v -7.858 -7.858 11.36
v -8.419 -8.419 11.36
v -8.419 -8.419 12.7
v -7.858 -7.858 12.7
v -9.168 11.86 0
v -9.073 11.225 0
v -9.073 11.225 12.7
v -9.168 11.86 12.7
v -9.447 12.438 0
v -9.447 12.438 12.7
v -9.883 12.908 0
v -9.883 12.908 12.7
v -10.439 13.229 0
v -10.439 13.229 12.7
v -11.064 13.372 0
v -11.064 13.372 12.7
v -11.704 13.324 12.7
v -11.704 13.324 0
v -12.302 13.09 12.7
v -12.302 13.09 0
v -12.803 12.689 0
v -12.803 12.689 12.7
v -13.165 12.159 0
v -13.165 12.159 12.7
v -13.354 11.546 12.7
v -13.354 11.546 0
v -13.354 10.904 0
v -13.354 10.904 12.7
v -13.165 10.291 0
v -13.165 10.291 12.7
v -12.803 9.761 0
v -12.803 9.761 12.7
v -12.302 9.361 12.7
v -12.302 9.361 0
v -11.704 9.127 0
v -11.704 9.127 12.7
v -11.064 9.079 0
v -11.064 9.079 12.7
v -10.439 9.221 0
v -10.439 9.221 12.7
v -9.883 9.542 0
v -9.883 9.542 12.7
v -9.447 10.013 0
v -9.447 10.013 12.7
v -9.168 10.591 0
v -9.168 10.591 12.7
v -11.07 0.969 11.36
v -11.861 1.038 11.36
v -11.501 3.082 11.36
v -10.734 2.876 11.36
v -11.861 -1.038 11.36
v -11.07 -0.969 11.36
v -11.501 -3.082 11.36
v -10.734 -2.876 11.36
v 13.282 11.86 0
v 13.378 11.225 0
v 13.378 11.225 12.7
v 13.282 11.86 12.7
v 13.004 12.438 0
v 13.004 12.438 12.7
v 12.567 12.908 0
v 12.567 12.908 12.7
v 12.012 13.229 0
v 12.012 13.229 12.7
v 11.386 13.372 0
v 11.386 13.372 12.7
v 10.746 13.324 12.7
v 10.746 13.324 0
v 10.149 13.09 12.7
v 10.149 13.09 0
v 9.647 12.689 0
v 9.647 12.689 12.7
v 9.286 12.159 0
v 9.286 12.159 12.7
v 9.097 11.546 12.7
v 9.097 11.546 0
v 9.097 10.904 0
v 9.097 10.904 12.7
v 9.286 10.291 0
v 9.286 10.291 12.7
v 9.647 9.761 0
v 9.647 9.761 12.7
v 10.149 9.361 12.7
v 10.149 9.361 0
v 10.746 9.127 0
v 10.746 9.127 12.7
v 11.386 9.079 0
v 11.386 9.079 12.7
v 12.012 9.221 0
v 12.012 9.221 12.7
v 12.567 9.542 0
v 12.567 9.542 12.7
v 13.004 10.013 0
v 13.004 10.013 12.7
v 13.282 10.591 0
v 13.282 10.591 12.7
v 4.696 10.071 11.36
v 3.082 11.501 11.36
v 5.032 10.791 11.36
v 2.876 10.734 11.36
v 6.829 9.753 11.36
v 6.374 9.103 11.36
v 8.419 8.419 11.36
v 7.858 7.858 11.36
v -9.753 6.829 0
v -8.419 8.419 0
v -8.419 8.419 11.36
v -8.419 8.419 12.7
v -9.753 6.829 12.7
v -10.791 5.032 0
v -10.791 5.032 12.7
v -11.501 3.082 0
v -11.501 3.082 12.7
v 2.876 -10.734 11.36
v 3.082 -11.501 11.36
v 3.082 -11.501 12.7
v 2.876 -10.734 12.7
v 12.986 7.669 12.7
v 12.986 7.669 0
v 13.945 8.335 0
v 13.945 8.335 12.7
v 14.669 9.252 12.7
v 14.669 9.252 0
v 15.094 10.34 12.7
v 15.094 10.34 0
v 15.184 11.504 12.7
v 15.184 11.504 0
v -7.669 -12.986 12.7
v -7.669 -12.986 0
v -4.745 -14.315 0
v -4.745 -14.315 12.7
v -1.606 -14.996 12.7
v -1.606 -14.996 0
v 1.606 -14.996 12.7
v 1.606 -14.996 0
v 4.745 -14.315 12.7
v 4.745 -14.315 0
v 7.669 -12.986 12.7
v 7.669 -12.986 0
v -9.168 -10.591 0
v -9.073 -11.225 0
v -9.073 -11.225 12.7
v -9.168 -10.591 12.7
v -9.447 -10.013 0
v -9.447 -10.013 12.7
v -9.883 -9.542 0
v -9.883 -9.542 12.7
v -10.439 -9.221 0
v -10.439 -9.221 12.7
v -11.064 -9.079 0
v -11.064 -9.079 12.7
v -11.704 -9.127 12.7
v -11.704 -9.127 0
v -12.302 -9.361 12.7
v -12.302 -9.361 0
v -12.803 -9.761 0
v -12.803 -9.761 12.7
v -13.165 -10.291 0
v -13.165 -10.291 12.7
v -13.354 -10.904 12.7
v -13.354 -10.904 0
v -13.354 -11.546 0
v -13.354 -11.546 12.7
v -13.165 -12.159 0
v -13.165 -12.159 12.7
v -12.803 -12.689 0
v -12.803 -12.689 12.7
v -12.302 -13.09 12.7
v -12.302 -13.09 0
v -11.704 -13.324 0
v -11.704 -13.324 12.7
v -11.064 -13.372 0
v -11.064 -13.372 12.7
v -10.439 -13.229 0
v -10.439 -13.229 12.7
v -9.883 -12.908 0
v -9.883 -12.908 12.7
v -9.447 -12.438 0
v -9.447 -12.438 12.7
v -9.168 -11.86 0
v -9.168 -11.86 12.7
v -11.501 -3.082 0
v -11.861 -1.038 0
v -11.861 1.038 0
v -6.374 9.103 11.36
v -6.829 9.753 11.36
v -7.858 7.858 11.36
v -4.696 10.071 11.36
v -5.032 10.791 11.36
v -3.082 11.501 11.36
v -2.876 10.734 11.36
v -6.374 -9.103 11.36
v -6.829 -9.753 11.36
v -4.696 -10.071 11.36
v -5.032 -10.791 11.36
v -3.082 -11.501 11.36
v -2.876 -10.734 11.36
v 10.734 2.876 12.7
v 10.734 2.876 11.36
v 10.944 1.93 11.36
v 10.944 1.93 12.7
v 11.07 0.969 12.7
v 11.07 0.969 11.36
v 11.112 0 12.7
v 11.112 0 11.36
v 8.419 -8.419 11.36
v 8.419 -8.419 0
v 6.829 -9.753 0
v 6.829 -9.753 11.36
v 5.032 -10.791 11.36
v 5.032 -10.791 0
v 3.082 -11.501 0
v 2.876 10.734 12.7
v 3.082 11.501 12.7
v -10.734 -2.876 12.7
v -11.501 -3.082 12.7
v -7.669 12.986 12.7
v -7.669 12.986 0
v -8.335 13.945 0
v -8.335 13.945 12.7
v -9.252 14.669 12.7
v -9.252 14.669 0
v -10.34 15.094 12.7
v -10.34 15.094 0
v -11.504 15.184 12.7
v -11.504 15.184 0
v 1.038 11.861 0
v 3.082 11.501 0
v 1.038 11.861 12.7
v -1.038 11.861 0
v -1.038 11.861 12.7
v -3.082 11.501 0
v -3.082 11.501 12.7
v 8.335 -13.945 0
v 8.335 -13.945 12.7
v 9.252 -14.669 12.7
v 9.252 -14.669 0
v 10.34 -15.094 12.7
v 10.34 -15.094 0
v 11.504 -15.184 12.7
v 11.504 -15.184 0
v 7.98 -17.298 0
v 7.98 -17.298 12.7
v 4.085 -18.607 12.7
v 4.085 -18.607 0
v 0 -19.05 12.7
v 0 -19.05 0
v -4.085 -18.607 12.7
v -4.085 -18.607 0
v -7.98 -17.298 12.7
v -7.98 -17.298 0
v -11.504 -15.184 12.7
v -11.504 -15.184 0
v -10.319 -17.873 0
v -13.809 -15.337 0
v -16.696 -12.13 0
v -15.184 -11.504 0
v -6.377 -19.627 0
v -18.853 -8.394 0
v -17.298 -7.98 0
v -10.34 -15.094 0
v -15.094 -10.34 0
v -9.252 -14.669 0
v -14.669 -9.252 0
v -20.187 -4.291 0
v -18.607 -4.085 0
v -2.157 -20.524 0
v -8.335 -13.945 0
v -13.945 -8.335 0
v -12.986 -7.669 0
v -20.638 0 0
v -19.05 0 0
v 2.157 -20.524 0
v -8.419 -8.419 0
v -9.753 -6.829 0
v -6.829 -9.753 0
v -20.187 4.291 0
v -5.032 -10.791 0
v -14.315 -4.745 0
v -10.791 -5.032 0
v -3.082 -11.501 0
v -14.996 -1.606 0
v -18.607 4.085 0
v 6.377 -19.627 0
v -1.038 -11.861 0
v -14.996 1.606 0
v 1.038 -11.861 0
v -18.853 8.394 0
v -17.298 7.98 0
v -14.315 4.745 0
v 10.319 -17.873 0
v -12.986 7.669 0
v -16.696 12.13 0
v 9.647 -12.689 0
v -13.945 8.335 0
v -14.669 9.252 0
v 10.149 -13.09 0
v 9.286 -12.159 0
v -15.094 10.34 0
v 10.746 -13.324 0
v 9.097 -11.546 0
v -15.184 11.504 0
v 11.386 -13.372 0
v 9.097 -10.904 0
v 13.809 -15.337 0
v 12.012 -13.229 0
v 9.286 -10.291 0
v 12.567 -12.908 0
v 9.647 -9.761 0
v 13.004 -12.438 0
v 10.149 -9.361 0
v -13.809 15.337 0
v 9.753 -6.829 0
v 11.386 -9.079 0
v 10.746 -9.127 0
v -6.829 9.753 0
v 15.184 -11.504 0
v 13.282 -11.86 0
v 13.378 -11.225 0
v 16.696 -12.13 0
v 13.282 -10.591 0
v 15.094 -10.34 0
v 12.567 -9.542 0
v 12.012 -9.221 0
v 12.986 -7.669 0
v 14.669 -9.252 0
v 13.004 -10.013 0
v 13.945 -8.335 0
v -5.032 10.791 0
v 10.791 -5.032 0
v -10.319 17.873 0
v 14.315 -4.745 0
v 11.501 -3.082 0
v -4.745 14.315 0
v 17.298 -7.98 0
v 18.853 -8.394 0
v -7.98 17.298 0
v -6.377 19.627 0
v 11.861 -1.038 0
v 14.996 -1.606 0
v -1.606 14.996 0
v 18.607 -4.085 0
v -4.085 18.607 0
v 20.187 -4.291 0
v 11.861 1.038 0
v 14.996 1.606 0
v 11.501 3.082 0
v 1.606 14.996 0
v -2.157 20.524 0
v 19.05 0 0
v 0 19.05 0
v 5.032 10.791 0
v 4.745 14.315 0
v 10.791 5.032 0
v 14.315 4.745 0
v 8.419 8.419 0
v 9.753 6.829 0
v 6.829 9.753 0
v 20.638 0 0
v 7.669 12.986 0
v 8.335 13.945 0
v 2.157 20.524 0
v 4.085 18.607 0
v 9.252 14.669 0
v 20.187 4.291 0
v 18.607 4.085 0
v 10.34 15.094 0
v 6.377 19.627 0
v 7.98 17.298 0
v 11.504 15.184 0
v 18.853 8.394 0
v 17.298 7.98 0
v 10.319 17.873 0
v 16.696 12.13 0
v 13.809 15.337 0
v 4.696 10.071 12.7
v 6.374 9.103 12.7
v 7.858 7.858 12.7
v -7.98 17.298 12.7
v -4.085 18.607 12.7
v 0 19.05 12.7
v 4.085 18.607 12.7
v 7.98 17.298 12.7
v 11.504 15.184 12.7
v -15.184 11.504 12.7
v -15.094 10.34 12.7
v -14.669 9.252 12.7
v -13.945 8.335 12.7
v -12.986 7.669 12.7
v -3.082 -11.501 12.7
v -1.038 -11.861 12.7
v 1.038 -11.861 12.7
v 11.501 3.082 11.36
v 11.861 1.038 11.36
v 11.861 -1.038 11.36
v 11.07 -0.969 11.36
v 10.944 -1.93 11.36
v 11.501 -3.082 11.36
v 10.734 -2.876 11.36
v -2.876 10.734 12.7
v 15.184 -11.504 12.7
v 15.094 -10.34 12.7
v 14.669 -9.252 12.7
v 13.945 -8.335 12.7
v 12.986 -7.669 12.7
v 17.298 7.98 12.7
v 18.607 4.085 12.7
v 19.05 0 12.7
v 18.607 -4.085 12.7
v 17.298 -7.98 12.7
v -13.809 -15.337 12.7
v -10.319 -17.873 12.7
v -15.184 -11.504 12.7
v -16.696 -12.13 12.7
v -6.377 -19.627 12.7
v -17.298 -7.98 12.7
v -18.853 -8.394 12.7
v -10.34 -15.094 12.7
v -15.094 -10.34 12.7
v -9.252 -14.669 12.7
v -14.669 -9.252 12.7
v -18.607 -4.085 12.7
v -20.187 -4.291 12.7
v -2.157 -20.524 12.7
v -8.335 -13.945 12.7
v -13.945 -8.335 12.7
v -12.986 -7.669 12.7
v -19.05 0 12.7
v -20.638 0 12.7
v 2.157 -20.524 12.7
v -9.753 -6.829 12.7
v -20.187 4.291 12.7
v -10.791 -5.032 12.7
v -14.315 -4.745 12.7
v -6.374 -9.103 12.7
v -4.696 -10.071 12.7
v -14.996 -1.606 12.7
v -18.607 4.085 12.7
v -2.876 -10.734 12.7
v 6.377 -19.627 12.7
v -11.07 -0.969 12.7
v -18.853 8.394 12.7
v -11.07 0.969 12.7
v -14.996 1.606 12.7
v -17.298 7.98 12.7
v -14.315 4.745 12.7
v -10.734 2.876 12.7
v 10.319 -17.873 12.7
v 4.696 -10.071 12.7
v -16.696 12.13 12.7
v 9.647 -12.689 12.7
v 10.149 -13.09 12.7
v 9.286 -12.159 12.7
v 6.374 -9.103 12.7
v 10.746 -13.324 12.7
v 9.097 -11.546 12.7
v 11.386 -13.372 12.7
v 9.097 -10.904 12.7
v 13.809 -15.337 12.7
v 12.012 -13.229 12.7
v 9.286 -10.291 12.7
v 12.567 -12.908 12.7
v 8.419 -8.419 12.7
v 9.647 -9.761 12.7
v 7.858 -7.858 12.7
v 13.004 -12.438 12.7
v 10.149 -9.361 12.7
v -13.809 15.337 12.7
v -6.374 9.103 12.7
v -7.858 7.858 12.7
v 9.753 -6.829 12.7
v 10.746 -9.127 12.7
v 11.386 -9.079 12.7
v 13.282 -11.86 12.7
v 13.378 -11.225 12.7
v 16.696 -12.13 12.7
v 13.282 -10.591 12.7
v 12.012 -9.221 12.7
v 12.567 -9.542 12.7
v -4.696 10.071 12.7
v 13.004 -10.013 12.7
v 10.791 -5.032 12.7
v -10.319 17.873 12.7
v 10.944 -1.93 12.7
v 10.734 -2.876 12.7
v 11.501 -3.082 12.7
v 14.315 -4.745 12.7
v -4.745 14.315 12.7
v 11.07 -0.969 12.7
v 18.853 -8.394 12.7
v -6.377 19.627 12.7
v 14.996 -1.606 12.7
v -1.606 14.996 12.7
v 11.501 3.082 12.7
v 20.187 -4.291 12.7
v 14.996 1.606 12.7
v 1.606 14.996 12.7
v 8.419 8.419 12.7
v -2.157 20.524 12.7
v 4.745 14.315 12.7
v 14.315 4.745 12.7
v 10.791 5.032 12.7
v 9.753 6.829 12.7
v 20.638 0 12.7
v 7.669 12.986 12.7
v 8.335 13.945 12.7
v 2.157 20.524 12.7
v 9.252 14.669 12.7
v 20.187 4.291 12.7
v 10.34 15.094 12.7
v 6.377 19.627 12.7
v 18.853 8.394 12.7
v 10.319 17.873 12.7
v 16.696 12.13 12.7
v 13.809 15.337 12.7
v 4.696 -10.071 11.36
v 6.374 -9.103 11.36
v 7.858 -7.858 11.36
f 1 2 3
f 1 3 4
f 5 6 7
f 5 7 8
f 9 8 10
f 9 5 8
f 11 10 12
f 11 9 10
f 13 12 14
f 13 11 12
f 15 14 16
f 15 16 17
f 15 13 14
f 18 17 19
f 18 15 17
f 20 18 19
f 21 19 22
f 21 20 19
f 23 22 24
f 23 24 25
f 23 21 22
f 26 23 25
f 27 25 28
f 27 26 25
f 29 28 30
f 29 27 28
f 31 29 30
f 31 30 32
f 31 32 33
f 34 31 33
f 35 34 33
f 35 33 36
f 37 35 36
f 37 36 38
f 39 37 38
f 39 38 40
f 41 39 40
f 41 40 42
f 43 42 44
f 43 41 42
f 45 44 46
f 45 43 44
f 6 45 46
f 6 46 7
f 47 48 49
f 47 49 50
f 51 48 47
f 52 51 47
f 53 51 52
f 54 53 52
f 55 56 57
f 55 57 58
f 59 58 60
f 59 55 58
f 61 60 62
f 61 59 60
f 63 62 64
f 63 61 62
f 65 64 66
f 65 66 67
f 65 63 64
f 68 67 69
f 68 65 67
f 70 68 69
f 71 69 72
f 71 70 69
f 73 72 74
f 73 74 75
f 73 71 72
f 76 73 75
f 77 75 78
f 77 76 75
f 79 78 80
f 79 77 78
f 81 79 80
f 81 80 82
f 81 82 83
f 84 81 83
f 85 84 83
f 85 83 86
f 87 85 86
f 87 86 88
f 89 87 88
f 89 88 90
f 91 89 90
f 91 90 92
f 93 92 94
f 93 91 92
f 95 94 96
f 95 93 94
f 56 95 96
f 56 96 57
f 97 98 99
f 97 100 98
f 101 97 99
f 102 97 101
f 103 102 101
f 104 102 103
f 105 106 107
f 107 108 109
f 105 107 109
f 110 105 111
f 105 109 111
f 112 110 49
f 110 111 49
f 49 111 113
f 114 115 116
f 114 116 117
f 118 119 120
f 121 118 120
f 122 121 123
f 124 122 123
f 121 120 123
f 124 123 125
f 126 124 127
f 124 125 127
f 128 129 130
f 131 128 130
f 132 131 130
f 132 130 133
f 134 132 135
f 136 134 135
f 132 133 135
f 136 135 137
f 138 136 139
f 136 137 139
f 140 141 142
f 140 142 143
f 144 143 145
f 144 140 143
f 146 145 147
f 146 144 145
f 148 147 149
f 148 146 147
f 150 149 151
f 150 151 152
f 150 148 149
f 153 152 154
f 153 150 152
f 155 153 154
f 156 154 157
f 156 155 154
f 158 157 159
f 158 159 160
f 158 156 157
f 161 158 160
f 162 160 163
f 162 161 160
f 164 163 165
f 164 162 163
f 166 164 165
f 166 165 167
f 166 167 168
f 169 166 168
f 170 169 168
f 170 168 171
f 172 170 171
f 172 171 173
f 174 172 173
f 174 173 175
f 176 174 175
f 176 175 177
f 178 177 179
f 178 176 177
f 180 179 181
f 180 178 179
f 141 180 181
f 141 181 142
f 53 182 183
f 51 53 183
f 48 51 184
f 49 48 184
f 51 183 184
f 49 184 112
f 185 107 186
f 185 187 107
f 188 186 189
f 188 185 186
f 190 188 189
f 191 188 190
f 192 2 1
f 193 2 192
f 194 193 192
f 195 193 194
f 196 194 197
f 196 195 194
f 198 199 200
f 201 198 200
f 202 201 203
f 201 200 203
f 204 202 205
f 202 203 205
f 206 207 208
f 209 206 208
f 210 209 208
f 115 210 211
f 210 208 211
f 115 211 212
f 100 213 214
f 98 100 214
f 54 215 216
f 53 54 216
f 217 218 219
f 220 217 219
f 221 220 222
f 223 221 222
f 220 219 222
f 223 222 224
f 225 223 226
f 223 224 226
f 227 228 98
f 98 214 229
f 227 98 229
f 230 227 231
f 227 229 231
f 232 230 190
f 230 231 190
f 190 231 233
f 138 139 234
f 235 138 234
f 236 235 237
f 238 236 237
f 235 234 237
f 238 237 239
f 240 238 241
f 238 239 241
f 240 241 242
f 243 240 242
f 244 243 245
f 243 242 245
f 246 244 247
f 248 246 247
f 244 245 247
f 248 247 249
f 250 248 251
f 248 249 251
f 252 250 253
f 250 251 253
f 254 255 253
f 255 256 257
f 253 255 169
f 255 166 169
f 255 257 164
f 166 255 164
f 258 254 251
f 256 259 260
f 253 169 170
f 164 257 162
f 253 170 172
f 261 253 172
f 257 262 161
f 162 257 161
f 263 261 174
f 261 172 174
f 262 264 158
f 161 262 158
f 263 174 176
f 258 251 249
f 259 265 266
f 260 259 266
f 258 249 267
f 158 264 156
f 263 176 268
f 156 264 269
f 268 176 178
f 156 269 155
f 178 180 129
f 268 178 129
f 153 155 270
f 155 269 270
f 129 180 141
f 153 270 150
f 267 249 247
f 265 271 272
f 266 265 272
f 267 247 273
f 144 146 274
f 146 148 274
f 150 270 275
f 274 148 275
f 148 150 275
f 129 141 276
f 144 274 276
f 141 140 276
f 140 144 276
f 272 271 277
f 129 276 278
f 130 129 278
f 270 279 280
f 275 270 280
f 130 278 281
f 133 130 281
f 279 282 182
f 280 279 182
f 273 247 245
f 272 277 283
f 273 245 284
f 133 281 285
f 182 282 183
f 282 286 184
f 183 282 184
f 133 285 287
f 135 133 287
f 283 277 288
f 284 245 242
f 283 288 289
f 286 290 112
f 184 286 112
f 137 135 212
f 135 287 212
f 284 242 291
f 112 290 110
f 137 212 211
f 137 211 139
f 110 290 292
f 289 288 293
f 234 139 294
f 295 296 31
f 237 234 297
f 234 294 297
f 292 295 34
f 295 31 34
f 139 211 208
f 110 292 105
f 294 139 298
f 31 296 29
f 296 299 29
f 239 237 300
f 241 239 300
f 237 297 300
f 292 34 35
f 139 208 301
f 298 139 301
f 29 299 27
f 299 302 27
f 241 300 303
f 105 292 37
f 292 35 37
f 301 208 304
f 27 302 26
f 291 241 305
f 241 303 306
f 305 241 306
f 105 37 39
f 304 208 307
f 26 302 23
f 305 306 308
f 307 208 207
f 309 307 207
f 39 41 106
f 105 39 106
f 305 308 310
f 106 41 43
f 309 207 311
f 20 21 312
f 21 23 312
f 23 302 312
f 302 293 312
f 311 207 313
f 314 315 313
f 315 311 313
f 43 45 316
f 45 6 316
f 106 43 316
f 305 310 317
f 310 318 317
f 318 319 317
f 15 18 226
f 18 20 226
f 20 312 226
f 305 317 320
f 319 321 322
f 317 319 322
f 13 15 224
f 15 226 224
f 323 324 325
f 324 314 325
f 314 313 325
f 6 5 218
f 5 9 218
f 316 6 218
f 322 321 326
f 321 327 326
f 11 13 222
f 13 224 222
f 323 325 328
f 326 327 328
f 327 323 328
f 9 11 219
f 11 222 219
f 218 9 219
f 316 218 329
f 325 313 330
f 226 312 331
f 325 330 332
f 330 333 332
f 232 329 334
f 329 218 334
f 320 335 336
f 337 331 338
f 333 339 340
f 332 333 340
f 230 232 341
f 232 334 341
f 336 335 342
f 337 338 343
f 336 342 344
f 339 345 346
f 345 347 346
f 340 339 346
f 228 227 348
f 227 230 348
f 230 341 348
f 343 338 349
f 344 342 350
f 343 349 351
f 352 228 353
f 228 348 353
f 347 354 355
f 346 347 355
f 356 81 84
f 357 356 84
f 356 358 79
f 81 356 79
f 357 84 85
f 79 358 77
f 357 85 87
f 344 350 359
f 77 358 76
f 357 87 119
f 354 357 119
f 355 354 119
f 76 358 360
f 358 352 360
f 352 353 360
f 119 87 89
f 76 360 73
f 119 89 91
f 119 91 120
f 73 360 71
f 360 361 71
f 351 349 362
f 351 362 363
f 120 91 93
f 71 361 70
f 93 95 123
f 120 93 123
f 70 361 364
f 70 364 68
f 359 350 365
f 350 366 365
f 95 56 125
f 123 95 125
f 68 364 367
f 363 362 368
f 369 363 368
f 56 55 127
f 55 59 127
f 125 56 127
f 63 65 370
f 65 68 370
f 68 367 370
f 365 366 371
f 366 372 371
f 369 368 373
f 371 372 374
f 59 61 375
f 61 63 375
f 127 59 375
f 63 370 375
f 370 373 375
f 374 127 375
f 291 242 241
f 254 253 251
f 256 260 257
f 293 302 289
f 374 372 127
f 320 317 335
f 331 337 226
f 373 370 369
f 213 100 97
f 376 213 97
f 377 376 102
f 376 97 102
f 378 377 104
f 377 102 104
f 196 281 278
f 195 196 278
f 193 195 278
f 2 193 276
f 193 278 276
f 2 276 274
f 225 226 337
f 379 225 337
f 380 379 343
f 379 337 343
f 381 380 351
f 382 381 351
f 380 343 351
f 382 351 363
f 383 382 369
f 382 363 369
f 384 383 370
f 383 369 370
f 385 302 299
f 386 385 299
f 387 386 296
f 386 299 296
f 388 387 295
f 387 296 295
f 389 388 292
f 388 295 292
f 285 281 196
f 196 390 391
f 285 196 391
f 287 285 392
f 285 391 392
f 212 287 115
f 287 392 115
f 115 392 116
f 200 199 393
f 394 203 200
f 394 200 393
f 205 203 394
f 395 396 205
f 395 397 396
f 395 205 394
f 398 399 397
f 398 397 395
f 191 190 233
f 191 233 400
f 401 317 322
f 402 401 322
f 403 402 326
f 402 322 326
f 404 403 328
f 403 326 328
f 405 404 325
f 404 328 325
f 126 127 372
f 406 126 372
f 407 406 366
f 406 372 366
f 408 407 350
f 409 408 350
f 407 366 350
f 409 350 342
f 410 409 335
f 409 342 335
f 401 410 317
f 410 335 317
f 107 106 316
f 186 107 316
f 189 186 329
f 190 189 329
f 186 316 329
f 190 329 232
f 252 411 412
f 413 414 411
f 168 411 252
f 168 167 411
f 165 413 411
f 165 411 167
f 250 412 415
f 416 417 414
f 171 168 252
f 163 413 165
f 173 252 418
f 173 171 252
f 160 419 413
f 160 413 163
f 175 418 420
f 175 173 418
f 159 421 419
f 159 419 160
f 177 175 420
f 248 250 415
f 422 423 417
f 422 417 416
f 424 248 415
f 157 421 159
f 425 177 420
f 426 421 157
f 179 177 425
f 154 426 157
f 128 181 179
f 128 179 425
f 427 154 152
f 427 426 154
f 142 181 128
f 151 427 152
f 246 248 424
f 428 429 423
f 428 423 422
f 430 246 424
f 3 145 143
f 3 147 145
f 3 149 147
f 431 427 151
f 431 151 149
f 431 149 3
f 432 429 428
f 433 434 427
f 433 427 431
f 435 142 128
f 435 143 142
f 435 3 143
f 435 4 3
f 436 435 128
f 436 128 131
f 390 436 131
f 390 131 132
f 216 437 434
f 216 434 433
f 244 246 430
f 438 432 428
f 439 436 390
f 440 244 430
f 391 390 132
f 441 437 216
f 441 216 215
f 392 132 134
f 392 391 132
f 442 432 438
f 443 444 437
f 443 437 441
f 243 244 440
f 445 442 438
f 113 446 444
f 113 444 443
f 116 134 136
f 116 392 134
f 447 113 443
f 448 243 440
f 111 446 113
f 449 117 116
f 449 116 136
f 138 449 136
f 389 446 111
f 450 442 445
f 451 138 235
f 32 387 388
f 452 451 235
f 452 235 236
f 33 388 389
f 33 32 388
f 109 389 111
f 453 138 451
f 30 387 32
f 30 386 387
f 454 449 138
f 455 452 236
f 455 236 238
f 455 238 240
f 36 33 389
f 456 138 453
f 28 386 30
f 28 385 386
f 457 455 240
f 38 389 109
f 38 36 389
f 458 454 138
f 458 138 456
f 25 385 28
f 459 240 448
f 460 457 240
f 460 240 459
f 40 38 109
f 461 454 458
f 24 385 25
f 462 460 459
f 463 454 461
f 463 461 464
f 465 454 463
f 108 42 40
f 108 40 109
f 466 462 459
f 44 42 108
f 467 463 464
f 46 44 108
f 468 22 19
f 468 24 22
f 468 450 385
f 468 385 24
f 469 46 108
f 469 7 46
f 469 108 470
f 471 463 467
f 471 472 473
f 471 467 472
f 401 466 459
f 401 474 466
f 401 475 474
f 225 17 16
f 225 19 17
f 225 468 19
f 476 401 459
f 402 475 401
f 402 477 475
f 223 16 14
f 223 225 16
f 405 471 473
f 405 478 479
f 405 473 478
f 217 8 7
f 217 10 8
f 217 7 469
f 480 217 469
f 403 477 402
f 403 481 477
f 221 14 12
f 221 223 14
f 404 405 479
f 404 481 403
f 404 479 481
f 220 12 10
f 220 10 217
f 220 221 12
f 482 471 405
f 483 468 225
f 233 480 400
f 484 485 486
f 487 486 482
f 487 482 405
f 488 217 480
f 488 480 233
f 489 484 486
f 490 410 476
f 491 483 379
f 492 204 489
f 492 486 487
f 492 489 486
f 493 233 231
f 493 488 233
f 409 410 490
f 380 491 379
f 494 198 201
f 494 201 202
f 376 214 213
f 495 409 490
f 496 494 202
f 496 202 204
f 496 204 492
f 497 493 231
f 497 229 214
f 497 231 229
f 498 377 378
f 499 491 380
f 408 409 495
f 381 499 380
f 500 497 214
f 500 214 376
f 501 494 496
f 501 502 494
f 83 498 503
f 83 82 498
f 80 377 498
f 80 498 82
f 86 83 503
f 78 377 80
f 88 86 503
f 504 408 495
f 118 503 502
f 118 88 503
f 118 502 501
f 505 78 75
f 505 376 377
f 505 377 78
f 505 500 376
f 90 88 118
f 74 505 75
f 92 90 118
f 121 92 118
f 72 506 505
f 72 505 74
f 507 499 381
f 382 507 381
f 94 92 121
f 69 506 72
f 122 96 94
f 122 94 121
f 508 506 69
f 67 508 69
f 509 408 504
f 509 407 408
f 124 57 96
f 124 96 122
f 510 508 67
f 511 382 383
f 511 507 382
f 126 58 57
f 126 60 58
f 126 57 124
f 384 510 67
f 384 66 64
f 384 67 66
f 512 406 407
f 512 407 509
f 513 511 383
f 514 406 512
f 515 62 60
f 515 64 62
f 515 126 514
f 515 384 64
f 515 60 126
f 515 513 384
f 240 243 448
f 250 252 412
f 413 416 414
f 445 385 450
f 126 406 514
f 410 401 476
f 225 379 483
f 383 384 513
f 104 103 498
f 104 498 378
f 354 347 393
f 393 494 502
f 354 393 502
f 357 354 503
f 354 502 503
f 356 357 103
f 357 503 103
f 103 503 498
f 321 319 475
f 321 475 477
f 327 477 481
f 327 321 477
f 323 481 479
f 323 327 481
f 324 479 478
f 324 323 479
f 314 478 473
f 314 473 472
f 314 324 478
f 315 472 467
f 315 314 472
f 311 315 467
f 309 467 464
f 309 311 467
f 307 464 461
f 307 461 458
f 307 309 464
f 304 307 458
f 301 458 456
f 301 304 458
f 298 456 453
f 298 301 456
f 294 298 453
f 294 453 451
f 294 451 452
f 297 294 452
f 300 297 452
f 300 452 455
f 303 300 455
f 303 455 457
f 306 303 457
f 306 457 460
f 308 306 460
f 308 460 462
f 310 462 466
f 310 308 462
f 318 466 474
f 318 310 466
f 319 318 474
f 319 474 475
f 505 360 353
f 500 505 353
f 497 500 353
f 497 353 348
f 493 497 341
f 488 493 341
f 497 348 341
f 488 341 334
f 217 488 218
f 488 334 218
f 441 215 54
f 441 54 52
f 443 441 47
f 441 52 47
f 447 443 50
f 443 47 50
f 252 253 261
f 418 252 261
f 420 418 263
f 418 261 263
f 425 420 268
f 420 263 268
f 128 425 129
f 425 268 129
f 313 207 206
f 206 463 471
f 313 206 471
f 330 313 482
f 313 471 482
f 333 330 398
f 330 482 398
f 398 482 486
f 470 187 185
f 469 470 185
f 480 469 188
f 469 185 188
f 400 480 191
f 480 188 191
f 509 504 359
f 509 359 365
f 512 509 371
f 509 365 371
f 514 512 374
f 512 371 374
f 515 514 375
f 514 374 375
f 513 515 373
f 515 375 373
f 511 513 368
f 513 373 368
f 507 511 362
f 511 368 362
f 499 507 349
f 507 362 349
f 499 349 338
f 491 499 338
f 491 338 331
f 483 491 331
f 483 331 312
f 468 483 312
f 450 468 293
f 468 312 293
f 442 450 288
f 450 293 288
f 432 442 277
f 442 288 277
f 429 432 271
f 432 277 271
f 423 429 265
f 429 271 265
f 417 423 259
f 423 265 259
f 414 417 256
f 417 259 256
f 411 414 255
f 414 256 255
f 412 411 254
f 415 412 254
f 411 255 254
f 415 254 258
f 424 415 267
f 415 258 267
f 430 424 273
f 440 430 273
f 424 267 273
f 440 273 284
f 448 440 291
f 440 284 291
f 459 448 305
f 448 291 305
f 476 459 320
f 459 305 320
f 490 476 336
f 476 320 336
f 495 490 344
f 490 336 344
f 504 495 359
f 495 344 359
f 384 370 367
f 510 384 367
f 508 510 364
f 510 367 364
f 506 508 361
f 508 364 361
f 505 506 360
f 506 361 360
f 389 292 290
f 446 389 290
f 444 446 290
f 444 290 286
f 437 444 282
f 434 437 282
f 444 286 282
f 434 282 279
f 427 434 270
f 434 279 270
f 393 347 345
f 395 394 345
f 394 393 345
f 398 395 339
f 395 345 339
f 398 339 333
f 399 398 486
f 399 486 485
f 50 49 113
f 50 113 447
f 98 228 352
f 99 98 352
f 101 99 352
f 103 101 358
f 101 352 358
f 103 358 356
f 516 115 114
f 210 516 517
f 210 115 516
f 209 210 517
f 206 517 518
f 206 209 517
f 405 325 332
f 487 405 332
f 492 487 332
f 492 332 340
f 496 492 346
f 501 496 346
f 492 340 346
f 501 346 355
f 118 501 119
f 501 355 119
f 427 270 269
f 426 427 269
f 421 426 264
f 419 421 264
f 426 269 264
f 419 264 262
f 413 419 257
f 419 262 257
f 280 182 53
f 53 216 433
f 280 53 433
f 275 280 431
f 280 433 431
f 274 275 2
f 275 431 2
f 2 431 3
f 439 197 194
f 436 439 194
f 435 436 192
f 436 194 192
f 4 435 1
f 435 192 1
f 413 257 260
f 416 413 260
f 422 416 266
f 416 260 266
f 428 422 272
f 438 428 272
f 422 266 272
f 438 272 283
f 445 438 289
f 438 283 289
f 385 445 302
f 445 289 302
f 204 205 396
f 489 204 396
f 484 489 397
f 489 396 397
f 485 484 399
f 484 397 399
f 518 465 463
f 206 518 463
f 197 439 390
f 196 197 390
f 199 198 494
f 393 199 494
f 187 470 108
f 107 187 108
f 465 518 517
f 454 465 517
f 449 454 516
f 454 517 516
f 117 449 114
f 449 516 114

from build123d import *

# Parameters (mm, degrees)
F0_R            = 20.6375
F0_R_2          = 2.15265
F1_DEPTH        = 12.7
F3_DEPTH        = 12.7
F4_COUNT        = 6
F4_ANGLE        = 300
F6_R            = 11.90625
F7_DEPTH        = 11.36015
F9_DEPTH        = 12.7
F9_COPIES_COUNT = 4


# Not quite as in the source:
# - a pattern or mirror of a feature is missing from the dataset's text; its kind, count and spacing are read off the source's solid


with BuildPart() as f1:
    # F0 (on Top) → F1 (new body)
    with BuildSketch(Plane.XY):
        Circle(F0_R)
        with Locations((-11.2253201513, -11.2253201513)):
            Circle(F0_R_2, mode=Mode.SUBTRACT)
        with Locations((11.2253201513, -11.2253201513)):
            Circle(F0_R_2, mode=Mode.SUBTRACT)
        with Locations((-11.2253201513, 11.2253201513)):
            Circle(F0_R_2, mode=Mode.SUBTRACT)
        with BuildLine():
            ThreePointArc((0, 11.1125), (7.8577241059, 7.8577241059), (11.1125, 0))
            ThreePointArc((11.1125, 0), (-7.8577241059, -7.8577241059), (0, 11.1125))
        make_face(mode=Mode.SUBTRACT)
        with Locations((11.2253201513, 11.2253201513)):
            Circle(F0_R_2, mode=Mode.SUBTRACT)
    extrude(amount=F1_DEPTH)

    # F2 (on face) → F3 (cut, through all)
    with BuildSketch(Plane.XY.offset(12.7)):
        with BuildLine():
            ThreePointArc((-2.8761266387, 10.7338507446), (0, 11.1125), (2.8761266387, 10.7338507446))
            Line((2.8761266387, 10.7338507446), (3.0815642558, 11.5005543693))
            ThreePointArc((3.0815642558, 11.5005543693), (0, 11.90625), (-3.0815642558, 11.5005543693))
            Line((-3.0815642558, 11.5005543693), (-2.8761266387, 10.7338507446))
        make_face()
    f3 = extrude(amount=-F3_DEPTH, mode=Mode.SUBTRACT)

    # F4: F3 ×6 about axis
    f4_axis = Axis((0, 0, 0), (0, 0, -1))
    for i in range(1, F4_COUNT):
        add(f3.rotate(f4_axis, i * F4_ANGLE / (F4_COUNT - 1)), mode=Mode.SUBTRACT)

    # F6 (on face) → F7 (cut, through all)
    with BuildSketch(Plane(origin=(0, 0, 0), x_dir=(1, 0, 0), z_dir=(0, 0, -1))):
        Circle(F6_R)
    extrude(amount=-F7_DEPTH, mode=Mode.SUBTRACT)

    # F8 (on face) → F9 (cut, through all)
    with BuildSketch(Plane(origin=(0, 0, 0), x_dir=(1, 0, 0), z_dir=(0, 0, -1))):
        with BuildLine():
            ThreePointArc((11.5039191556, -15.1842795042), (9.251826165, -14.6686177057), (7.6685282311, -12.9860608474))
            ThreePointArc((7.6685282311, -12.9860608474), (0, -15.08125), (-7.6685282311, -12.9860608474))
            ThreePointArc((-7.6685282311, -12.9860608474), (-9.251826165, -14.6686177057), (-11.5039191556, -15.1842795042))
            ThreePointArc((-11.5039191556, -15.1842795042), (0, -19.05), (11.5039191556, -15.1842795042))
        make_face()
    f9 = extrude(amount=-F9_DEPTH, mode=Mode.SUBTRACT)

    # F9_copies: F9 ×4 about axis
    f9_copies_axis = Axis((0, 0, 0), (0, 0, 1))
    for i in range(1, F9_COPIES_COUNT):
        add(f9.rotate(f9_copies_axis, i * 360 / F9_COPIES_COUNT), mode=Mode.SUBTRACT)


solid = f1.part
